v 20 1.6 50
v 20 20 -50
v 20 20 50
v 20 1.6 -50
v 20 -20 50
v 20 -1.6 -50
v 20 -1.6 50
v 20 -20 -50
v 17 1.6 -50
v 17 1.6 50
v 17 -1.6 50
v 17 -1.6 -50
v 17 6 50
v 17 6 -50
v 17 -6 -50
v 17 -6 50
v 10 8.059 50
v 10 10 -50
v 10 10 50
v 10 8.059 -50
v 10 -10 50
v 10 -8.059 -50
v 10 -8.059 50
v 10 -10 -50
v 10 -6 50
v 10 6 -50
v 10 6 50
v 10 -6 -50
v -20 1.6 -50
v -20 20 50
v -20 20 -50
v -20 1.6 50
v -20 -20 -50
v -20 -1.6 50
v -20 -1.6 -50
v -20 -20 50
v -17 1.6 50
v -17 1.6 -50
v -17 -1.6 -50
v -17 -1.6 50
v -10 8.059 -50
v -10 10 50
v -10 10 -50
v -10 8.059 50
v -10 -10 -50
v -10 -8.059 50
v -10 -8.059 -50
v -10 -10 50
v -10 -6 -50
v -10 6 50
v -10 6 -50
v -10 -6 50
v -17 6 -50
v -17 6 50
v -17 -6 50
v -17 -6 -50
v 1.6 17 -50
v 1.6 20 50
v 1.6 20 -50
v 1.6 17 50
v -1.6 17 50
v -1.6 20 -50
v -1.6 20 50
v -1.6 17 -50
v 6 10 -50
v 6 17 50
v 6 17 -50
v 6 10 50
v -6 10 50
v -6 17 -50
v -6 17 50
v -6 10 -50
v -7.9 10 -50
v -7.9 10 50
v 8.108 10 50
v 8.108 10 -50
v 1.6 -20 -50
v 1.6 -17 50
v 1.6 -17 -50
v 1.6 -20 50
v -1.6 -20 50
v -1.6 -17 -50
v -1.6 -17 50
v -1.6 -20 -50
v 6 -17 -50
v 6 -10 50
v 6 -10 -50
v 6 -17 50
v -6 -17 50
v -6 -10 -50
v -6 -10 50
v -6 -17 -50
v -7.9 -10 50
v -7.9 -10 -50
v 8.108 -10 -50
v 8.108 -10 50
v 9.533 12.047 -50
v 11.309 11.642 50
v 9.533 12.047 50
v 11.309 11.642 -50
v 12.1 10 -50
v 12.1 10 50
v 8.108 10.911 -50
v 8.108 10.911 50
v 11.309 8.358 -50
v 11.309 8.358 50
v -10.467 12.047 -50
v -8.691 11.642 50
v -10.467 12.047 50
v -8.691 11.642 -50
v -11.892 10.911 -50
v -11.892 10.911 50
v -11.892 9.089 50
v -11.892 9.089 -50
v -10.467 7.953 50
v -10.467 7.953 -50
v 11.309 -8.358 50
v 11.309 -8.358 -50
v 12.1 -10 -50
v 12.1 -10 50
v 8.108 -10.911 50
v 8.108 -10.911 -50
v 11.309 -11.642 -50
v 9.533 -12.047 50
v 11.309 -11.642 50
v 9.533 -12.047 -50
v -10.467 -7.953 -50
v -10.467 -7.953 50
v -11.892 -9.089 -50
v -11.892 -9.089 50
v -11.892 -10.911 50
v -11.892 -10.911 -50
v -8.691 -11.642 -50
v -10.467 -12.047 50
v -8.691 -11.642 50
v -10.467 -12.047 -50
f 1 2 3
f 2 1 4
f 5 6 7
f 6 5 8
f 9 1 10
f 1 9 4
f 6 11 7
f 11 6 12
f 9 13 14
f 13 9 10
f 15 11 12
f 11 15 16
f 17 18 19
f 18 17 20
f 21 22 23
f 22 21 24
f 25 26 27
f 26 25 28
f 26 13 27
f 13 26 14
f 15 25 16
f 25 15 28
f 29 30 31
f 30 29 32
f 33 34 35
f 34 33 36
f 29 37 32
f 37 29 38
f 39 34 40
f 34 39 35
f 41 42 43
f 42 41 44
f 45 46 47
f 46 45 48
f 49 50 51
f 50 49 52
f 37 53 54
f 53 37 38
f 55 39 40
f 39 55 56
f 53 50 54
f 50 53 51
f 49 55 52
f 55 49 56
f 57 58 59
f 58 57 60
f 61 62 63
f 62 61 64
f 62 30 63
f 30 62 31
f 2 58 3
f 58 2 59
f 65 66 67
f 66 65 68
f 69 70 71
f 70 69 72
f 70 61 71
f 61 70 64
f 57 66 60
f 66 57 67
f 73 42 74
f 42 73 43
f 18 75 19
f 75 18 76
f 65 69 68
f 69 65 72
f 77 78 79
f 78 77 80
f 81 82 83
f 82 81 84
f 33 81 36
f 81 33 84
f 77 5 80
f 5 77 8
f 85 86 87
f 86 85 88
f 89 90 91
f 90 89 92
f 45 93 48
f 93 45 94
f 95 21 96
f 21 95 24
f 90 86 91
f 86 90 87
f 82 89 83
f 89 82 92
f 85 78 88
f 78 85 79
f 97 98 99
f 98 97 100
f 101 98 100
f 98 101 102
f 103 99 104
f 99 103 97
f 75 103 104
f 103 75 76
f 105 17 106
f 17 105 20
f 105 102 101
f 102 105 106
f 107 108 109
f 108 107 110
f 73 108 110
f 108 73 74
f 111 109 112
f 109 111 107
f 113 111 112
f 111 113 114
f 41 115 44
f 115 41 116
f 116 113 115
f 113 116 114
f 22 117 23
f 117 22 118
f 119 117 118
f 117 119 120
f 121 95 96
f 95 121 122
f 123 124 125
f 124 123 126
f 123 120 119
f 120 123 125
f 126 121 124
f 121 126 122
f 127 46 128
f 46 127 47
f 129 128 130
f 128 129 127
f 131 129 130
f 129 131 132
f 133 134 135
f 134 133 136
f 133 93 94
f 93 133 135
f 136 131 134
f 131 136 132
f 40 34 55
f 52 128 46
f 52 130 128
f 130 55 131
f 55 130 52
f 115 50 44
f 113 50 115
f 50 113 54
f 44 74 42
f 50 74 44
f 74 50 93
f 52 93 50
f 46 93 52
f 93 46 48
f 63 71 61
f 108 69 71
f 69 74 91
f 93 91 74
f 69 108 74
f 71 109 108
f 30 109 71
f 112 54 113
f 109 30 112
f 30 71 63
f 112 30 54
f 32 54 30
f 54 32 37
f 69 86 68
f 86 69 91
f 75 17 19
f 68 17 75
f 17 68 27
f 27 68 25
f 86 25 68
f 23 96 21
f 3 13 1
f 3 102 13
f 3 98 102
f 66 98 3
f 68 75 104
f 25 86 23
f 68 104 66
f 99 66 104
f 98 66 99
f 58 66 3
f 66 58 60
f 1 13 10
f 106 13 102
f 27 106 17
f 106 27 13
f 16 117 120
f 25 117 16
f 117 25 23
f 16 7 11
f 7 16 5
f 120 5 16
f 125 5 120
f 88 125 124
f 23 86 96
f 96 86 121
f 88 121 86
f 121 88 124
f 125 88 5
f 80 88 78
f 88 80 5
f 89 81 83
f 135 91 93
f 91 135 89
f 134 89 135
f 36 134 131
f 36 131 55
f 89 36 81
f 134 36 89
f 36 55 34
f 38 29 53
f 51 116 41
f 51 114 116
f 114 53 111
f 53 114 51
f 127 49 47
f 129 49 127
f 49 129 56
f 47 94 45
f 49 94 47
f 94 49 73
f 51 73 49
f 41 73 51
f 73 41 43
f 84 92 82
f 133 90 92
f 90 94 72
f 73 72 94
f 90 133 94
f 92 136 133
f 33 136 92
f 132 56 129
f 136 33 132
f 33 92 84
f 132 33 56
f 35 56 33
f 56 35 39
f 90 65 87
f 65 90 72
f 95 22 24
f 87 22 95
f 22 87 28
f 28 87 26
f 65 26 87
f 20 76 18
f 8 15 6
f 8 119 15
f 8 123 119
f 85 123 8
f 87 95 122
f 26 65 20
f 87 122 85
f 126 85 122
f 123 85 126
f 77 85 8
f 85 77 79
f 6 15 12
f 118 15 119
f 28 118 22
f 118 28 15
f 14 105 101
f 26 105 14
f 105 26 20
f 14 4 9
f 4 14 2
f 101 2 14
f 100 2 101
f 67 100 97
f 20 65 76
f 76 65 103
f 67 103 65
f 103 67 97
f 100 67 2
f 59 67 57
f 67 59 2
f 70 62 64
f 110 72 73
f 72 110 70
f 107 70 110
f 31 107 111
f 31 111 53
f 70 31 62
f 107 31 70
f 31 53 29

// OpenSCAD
// Parameters
cross_section_width_mm = 40; //[20:80:1]
cross_section_height_mm = 40; //[20:80:1]
length_mm = 100; //[50:200:1]
center = 1; //[0:1:1]
cornerHole = 1; //[0:1:1]
outer_corner_radius_mm = 1.5; //[0.5:3:0.1]
t_slot_opening_mm = 8.2; //[6:12:0.1]
t_slot_depth_mm = 10; //[6:16:0.5]
t_slot_neck_mm = 3.2; //[2:6:0.1]
t_slot_inner_width_mm = 12; //[8:18:0.5]
t_slot_inner_depth_mm = 6; //[3:10:0.5]
center_bore_diameter_mm = 8.2; //[4:16:0.1]
corner_hole_diameter_mm = 4.2; //[2:8:0.1]
corner_hole_inset_mm = 10; //[6:16:0.5]
cut_overlap_mm = 1; //[0.5:2:0.1]

// Extrusion Profile Body
module extrusion_profile_body() {
  color("Silver") {
    cube([cross_section_width_mm, cross_section_height_mm, length_mm], center=true);
  }
}

// Center Bore
module center_bore() {
  color("Black") {
    cylinder(h=length_mm + 2*cut_overlap_mm, r=center_bore_diameter_mm/2, center=true);
  }
}

// T-Slot Channels
module t_slot_channels() {
  color("DimGray") {
    union() {
      translate([cross_section_width_mm/2 - (t_slot_depth_mm + cut_overlap_mm)/2, 0, 0])
        cube([t_slot_depth_mm + cut_overlap_mm, t_slot_neck_mm, length_mm + 2*cut_overlap_mm], center=true);
      translate([cross_section_width_mm/2 - t_slot_depth_mm + (t_slot_inner_depth_mm + cut_overlap_mm)/2, 0, 0])
        cube([t_slot_inner_depth_mm + cut_overlap_mm, t_slot_inner_width_mm, length_mm + 2*cut_overlap_mm], center=true);
      translate([-cross_section_width_mm/2 + (t_slot_depth_mm + cut_overlap_mm)/2, 0, 0])
        cube([t_slot_depth_mm + cut_overlap_mm, t_slot_neck_mm, length_mm + 2*cut_overlap_mm], center=true);
      translate([-cross_section_width_mm/2 + t_slot_depth_mm - (t_slot_inner_depth_mm + cut_overlap_mm)/2, 0, 0])
        cube([t_slot_inner_depth_mm + cut_overlap_mm, t_slot_inner_width_mm, length_mm + 2*cut_overlap_mm], center=true);
      translate([0, cross_section_height_mm/2 - (t_slot_depth_mm + cut_overlap_mm)/2, 0])
        cube([t_slot_neck_mm, t_slot_depth_mm + cut_overlap_mm, length_mm + 2*cut_overlap_mm], center=true);
      translate([0, cross_section_height_mm/2 - t_slot_depth_mm + (t_slot_inner_depth_mm + cut_overlap_mm)/2, 0])
        cube([t_slot_inner_width_mm, t_slot_inner_depth_mm + cut_overlap_mm, length_mm + 2*cut_overlap_mm], center=true);
      translate([0, -cross_section_height_mm/2 + (t_slot_depth_mm + cut_overlap_mm)/2, 0])
        cube([t_slot_neck_mm, t_slot_depth_mm + cut_overlap_mm, length_mm + 2*cut_overlap_mm], center=true);
      translate([0, -cross_section_height_mm/2 + t_slot_depth_mm - (t_slot_inner_depth_mm + cut_overlap_mm)/2, 0])
        cube([t_slot_inner_width_mm, t_slot_inner_depth_mm + cut_overlap_mm, length_mm + 2*cut_overlap_mm], center=true);
    }
  }
}

// Corner Holes
module corner_holes() {
  color("Black") {
    union() {
      translate([cross_section_width_mm/2 - corner_hole_inset_mm, cross_section_height_mm/2 - corner_hole_inset_mm, 0])
        cylinder(h=length_mm + 2*cut_overlap_mm, r=corner_hole_diameter_mm/2, center=true);
      translate([-cross_section_width_mm/2 + corner_hole_inset_mm, cross_section_height_mm/2 - corner_hole_inset_mm, 0])
        cylinder(h=length_mm + 2*cut_overlap_mm, r=corner_hole_diameter_mm/2, center=true);
      translate([cross_section_width_mm/2 - corner_hole_inset_mm, -cross_section_height_mm/2 + corner_hole_inset_mm, 0])
        cylinder(h=length_mm + 2*cut_overlap_mm, r=corner_hole_diameter_mm/2, center=true);
      translate([-cross_section_width_mm/2 + corner_hole_inset_mm, -cross_section_height_mm/2 + corner_hole_inset_mm, 0])
        cylinder(h=length_mm + 2*cut_overlap_mm, r=corner_hole_diameter_mm/2, center=true);
    }
  }
}

// Extrusion Cross Section
module extrusion_cross_section() {
  difference() {
    extrusion_profile_body();
    center_bore();
    t_slot_channels();
    corner_holes();
  }
}

// Box Corner Profile Section
module box_corner_profile_section() {
  color("Silver") {
    cube([cross_section_width_mm/2, cross_section_height_mm/2, length_mm], center=true);
  }
}

// Box Corner Profile Sections
module box_corner_profile_sections() {
  union() {
    box_corner_profile_section();
    extrusion_cross_section();
  }
}

// Final Assembly
module assembly() {
  extrusion_cross_section();
  box_corner_profile_sections();
}

assembly();
